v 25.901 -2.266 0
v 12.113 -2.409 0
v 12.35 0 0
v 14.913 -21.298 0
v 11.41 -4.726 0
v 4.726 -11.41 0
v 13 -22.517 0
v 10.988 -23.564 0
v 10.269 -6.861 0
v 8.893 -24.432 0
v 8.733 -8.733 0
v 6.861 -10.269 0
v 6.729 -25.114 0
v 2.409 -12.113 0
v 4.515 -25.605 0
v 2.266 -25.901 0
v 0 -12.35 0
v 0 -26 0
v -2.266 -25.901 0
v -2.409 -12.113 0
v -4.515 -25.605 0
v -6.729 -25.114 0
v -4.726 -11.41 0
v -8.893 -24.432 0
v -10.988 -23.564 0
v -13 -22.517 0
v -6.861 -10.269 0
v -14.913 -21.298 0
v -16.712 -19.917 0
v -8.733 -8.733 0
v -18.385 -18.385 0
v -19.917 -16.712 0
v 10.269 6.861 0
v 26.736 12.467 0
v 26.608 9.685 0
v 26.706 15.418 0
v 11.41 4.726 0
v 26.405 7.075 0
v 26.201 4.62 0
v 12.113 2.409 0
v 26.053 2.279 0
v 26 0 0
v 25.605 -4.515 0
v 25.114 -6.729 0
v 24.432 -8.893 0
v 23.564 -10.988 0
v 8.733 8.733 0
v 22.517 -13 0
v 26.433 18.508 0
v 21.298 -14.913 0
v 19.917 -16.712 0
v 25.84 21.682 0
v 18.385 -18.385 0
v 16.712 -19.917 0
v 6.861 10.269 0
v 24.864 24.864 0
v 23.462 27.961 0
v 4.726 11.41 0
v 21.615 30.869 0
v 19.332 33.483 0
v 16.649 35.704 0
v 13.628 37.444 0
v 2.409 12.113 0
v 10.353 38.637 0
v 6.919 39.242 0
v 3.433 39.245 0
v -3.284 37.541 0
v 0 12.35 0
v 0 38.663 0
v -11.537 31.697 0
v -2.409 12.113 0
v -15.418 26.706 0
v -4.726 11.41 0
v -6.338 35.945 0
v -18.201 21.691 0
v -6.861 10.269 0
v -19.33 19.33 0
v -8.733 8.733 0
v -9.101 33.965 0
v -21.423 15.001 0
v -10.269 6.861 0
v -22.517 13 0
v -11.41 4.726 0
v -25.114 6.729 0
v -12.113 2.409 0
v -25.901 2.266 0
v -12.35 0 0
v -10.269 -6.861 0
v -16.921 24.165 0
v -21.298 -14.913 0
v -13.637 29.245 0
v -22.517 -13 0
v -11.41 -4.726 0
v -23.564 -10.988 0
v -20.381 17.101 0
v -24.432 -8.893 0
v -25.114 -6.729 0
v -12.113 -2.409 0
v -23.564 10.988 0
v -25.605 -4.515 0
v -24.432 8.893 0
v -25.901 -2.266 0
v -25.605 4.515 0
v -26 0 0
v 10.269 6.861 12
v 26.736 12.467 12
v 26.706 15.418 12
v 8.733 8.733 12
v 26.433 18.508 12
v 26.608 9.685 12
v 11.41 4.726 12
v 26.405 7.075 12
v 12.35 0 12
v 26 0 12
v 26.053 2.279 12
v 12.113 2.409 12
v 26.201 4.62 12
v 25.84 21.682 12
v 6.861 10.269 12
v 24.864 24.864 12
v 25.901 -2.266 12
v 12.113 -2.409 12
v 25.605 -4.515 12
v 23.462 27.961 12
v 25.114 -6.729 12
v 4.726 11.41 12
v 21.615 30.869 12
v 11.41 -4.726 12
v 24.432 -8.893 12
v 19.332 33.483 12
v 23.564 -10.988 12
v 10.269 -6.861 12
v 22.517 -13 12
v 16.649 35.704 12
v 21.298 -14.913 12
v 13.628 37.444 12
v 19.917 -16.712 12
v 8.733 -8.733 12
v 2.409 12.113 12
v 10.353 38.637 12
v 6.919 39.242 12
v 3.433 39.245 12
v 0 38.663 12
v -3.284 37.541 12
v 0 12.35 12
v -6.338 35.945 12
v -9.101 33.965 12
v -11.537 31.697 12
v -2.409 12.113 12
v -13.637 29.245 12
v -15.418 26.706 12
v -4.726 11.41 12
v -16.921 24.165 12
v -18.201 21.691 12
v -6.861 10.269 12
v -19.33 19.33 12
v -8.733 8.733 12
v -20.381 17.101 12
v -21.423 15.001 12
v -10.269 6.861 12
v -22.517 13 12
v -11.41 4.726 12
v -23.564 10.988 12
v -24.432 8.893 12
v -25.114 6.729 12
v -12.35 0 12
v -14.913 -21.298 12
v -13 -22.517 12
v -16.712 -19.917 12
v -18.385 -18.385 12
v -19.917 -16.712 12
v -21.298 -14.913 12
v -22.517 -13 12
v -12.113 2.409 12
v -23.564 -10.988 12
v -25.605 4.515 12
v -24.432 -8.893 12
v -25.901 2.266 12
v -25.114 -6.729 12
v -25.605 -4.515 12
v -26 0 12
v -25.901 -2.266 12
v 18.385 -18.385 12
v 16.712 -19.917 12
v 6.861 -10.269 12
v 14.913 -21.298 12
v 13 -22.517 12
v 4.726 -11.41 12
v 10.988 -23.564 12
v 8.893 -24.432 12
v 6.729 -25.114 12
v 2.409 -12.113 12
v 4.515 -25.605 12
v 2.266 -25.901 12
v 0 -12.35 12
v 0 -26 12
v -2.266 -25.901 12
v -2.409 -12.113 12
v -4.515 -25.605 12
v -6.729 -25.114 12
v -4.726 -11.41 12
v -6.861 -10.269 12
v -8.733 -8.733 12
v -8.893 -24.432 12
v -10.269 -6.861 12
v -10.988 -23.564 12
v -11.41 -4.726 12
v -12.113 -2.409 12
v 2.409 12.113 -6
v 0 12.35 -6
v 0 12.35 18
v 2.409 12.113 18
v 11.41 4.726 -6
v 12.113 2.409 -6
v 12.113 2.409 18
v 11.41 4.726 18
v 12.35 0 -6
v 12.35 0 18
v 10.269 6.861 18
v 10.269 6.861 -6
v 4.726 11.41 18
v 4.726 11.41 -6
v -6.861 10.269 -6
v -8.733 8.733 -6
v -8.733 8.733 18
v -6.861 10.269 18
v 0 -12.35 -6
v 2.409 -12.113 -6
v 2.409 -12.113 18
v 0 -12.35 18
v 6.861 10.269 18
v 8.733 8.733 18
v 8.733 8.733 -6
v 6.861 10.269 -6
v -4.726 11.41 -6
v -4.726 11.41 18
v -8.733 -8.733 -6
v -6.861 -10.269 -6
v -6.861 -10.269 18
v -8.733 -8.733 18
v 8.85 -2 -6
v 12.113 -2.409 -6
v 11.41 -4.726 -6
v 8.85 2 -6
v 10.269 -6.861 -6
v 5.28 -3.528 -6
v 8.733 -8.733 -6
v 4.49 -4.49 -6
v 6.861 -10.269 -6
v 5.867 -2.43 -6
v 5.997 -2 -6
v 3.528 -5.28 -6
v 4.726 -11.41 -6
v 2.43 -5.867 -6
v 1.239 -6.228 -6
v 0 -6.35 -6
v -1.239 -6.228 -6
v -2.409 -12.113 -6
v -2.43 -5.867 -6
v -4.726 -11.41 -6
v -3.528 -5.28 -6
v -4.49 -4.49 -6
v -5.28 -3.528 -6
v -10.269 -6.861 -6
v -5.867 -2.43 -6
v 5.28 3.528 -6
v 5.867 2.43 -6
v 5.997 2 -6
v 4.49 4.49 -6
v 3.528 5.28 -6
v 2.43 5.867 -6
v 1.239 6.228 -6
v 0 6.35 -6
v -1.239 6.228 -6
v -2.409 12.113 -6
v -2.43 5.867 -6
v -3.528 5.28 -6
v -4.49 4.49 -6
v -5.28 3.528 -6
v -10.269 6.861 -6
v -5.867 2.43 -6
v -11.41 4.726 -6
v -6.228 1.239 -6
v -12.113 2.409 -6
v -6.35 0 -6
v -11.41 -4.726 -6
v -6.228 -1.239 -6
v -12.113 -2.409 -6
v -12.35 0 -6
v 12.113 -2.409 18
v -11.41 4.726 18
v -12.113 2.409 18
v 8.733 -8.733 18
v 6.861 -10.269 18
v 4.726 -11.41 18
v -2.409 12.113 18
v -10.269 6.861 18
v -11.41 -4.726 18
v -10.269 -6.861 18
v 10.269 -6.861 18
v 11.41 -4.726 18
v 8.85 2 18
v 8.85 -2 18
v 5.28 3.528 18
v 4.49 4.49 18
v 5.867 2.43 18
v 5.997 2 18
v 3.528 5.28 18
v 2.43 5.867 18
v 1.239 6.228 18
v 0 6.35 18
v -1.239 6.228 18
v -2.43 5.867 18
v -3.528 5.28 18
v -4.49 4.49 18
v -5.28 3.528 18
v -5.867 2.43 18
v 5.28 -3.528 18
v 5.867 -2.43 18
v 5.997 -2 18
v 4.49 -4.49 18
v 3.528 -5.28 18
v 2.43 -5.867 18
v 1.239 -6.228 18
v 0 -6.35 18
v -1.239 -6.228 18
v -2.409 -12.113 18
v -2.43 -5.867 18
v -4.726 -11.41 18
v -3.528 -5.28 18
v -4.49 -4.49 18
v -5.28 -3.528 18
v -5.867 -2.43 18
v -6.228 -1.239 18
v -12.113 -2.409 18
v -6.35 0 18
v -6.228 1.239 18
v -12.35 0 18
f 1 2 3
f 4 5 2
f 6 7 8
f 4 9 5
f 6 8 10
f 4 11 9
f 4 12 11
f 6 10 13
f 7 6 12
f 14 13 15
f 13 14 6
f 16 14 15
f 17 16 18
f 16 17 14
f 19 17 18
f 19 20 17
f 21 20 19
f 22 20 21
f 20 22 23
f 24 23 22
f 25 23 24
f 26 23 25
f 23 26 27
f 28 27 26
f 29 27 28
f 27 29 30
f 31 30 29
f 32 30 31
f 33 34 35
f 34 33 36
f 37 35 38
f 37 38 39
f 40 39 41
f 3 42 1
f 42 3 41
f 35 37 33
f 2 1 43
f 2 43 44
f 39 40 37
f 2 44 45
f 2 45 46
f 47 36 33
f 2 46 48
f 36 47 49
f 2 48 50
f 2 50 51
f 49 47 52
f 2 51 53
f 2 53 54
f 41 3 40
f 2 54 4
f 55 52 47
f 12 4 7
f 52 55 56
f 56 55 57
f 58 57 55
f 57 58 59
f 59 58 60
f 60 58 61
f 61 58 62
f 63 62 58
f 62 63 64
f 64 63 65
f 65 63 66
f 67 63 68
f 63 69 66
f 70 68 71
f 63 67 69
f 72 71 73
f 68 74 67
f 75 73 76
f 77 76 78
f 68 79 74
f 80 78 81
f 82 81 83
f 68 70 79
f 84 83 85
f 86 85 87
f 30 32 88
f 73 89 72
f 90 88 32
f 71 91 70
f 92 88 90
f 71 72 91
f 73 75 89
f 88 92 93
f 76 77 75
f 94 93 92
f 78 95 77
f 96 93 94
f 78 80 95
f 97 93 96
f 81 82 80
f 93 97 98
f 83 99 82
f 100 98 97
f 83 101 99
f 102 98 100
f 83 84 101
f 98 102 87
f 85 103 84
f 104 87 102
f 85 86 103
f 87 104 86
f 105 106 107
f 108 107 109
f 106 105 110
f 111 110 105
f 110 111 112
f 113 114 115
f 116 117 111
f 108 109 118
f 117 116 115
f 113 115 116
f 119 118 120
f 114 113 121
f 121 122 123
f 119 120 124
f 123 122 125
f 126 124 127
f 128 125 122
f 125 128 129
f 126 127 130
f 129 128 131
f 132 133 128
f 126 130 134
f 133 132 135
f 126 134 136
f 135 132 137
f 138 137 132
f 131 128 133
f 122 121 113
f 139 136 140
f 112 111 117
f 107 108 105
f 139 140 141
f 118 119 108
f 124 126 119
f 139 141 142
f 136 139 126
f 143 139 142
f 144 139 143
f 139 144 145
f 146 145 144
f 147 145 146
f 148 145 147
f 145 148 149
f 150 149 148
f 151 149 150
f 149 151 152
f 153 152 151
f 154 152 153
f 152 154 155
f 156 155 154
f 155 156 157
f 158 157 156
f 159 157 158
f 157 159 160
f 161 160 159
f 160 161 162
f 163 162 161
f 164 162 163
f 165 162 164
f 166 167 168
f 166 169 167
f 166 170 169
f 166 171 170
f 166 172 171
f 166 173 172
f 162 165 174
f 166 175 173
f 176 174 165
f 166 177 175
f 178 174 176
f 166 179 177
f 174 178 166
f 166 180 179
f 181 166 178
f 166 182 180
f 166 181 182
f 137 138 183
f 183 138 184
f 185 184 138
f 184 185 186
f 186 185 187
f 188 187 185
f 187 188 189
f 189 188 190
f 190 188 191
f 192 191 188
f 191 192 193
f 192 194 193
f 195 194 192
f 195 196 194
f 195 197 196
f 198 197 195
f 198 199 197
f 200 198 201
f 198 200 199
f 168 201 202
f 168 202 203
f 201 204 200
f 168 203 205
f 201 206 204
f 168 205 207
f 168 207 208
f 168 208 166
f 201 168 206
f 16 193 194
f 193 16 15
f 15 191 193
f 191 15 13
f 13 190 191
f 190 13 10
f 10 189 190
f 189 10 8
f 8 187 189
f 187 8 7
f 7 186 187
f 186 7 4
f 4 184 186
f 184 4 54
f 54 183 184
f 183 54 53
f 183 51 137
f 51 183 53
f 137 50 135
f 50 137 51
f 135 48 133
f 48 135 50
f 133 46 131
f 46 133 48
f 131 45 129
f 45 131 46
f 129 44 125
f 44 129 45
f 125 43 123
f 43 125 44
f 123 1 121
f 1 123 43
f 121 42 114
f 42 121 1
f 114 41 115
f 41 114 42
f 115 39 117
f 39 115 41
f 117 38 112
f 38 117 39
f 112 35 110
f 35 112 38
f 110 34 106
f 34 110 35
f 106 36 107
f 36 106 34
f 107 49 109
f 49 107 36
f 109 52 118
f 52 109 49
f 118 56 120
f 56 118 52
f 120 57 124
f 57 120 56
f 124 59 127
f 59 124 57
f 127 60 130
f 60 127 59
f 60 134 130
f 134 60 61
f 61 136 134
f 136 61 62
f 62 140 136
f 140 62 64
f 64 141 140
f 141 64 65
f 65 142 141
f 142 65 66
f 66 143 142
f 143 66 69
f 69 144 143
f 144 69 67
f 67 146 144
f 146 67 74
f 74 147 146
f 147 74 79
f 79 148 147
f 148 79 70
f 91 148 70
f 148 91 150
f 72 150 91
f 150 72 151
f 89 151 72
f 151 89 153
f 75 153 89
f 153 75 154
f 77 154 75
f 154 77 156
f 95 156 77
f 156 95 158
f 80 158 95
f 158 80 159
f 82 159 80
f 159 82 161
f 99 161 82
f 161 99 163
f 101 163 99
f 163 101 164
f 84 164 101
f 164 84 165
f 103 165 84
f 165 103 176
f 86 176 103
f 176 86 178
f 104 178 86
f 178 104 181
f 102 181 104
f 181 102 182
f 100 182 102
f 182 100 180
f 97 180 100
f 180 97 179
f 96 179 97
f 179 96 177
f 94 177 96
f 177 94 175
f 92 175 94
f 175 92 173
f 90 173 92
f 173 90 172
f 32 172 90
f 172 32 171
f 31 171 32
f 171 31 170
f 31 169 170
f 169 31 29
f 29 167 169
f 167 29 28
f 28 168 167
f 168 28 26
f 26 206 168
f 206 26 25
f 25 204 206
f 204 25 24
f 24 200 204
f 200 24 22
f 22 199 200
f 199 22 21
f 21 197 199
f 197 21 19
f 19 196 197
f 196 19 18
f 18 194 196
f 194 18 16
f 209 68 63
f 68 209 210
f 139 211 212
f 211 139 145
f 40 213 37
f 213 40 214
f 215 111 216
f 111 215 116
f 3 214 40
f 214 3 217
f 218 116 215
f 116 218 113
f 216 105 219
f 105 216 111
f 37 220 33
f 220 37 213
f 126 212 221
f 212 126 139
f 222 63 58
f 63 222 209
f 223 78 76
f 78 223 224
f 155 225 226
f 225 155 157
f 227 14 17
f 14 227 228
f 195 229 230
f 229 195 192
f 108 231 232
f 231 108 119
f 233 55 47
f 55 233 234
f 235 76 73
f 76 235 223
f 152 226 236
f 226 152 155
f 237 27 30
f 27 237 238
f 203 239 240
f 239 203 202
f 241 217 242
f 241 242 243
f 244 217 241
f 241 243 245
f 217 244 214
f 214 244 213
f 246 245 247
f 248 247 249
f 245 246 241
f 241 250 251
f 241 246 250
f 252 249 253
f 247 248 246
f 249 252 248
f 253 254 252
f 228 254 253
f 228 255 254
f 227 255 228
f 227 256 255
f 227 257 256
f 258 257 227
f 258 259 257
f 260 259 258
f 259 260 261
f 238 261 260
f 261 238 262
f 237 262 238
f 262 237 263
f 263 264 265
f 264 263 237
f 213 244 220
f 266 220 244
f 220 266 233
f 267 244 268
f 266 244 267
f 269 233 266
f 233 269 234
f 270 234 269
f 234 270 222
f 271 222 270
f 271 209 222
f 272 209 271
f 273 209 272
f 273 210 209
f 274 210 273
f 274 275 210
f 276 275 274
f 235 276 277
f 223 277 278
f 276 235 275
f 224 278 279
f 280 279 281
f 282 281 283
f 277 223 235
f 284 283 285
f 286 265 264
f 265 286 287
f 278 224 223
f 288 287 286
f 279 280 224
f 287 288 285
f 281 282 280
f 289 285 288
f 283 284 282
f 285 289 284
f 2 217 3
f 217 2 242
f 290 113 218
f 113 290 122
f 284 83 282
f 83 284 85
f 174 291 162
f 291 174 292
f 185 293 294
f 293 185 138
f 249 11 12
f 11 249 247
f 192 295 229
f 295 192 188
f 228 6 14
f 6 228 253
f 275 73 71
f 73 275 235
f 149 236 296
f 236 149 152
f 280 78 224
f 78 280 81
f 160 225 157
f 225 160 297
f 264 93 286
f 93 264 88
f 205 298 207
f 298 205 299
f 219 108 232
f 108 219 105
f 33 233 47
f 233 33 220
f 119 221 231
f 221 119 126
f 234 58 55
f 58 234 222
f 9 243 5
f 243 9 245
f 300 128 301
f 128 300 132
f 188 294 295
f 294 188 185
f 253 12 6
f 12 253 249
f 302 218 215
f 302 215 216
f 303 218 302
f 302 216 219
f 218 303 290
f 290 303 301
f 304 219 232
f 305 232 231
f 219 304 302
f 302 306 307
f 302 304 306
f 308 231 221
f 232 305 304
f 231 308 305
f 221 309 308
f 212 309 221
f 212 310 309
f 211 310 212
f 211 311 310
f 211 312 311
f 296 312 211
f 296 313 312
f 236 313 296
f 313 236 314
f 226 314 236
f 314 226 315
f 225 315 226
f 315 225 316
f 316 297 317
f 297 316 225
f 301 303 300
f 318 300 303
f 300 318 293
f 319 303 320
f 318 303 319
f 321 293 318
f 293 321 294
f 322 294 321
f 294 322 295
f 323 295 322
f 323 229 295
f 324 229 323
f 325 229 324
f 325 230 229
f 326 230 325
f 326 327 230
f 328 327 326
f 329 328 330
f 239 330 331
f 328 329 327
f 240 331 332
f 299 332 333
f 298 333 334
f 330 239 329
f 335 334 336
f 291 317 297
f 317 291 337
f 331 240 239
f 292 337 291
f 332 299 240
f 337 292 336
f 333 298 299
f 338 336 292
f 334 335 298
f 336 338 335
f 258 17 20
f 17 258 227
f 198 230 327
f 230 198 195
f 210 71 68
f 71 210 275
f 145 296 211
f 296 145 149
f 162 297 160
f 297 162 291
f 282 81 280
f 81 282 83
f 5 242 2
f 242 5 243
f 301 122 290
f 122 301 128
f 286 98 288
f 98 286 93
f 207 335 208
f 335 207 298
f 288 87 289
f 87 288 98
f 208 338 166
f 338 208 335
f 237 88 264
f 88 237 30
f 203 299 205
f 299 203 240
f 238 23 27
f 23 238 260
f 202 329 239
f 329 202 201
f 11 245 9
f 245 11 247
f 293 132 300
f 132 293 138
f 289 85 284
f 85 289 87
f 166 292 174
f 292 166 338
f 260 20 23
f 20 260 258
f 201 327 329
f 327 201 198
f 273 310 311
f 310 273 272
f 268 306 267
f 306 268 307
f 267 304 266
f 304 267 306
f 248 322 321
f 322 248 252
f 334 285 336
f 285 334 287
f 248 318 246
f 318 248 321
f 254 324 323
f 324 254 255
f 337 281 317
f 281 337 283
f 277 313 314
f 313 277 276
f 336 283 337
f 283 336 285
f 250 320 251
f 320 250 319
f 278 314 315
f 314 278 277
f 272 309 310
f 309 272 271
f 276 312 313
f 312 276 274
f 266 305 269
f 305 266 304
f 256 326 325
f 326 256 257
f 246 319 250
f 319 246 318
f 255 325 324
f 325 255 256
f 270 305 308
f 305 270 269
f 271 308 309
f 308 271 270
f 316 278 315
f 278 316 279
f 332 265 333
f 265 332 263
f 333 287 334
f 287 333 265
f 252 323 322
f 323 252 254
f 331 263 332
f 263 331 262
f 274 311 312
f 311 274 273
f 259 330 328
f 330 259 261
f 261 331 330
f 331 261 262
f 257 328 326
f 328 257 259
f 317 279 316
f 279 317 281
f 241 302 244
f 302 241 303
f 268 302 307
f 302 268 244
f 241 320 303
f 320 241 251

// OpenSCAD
$fn = 32;

// ----------------------------------------------------------------------
// Cam: base radius 26 mm with a 14 mm lift over 150 degrees
// ----------------------------------------------------------------------

// --- parameters (mm) ---
base_r = 26;              // base radius
lift = 14;                // lift height above the base radius
lift_span = 150;          // angular width of the lift
lift_start = 0;           // angle where the lift starts
cam_t = 12;               // cam plate thickness
hub_d = 24.7;             // hub diameter
hub_h = 24;               // hub height
bore_d = 12.7;            // bore
key_w = 4;                // keyway width
key_depth = 2;            // keyway depth

cam_profile = [[26, 0], [26.053, 2.279], [26.201, 4.62], [26.405, 7.075], [26.608, 9.685], [26.736, 12.467], [26.706, 15.418], [26.433, 18.508], [25.84, 21.682], [24.864, 24.864], [23.462, 27.961], [21.615, 30.869], [19.332, 33.483], [16.649, 35.704], [13.628, 37.444], [10.353, 38.637], [6.919, 39.242], [3.433, 39.245], [0, 38.663], [-3.284, 37.541], [-6.338, 35.945], [-9.101, 33.965], [-11.537, 31.697], [-13.637, 29.245], [-15.418, 26.706], [-16.921, 24.165], [-18.201, 21.691], [-19.33, 19.33], [-20.381, 17.101], [-21.423, 15.001], [-22.517, 13], [-23.564, 10.988], [-24.432, 8.893], [-25.114, 6.729], [-25.605, 4.515], [-25.901, 2.266], [-26, 0], [-25.901, -2.266], [-25.605, -4.515], [-25.114, -6.729], [-24.432, -8.893], [-23.564, -10.988], [-22.517, -13], [-21.298, -14.913], [-19.917, -16.712], [-18.385, -18.385], [-16.712, -19.917], [-14.913, -21.298], [-13, -22.517], [-10.988, -23.564], [-8.893, -24.432], [-6.729, -25.114], [-4.515, -25.605], [-2.266, -25.901], [0, -26], [2.266, -25.901], [4.515, -25.605], [6.729, -25.114], [8.893, -24.432], [10.988, -23.564], [13, -22.517], [14.913, -21.298], [16.712, -19.917], [18.385, -18.385], [19.917, -16.712], [21.298, -14.913], [22.517, -13], [23.564, -10.988], [24.432, -8.893], [25.114, -6.729], [25.605, -4.515], [25.901, -2.266]];

difference() {
  union() {
    linear_extrude(height = cam_t) polygon(cam_profile);
    /* hub, proud of the cam plate on both sides */
    translate([0, 0, -6]) cylinder(h = hub_h, d = hub_d);
  }
  /* bore through the hub, 2.5 mm clear on both faces */
  translate([0, 0, -8.5]) cylinder(h = hub_h + 5, d = bore_d);
  /* keyway, milled through the whole hub */
  translate([4.35, -2, -8.5]) cube([4.5, 4, 29]);
}
